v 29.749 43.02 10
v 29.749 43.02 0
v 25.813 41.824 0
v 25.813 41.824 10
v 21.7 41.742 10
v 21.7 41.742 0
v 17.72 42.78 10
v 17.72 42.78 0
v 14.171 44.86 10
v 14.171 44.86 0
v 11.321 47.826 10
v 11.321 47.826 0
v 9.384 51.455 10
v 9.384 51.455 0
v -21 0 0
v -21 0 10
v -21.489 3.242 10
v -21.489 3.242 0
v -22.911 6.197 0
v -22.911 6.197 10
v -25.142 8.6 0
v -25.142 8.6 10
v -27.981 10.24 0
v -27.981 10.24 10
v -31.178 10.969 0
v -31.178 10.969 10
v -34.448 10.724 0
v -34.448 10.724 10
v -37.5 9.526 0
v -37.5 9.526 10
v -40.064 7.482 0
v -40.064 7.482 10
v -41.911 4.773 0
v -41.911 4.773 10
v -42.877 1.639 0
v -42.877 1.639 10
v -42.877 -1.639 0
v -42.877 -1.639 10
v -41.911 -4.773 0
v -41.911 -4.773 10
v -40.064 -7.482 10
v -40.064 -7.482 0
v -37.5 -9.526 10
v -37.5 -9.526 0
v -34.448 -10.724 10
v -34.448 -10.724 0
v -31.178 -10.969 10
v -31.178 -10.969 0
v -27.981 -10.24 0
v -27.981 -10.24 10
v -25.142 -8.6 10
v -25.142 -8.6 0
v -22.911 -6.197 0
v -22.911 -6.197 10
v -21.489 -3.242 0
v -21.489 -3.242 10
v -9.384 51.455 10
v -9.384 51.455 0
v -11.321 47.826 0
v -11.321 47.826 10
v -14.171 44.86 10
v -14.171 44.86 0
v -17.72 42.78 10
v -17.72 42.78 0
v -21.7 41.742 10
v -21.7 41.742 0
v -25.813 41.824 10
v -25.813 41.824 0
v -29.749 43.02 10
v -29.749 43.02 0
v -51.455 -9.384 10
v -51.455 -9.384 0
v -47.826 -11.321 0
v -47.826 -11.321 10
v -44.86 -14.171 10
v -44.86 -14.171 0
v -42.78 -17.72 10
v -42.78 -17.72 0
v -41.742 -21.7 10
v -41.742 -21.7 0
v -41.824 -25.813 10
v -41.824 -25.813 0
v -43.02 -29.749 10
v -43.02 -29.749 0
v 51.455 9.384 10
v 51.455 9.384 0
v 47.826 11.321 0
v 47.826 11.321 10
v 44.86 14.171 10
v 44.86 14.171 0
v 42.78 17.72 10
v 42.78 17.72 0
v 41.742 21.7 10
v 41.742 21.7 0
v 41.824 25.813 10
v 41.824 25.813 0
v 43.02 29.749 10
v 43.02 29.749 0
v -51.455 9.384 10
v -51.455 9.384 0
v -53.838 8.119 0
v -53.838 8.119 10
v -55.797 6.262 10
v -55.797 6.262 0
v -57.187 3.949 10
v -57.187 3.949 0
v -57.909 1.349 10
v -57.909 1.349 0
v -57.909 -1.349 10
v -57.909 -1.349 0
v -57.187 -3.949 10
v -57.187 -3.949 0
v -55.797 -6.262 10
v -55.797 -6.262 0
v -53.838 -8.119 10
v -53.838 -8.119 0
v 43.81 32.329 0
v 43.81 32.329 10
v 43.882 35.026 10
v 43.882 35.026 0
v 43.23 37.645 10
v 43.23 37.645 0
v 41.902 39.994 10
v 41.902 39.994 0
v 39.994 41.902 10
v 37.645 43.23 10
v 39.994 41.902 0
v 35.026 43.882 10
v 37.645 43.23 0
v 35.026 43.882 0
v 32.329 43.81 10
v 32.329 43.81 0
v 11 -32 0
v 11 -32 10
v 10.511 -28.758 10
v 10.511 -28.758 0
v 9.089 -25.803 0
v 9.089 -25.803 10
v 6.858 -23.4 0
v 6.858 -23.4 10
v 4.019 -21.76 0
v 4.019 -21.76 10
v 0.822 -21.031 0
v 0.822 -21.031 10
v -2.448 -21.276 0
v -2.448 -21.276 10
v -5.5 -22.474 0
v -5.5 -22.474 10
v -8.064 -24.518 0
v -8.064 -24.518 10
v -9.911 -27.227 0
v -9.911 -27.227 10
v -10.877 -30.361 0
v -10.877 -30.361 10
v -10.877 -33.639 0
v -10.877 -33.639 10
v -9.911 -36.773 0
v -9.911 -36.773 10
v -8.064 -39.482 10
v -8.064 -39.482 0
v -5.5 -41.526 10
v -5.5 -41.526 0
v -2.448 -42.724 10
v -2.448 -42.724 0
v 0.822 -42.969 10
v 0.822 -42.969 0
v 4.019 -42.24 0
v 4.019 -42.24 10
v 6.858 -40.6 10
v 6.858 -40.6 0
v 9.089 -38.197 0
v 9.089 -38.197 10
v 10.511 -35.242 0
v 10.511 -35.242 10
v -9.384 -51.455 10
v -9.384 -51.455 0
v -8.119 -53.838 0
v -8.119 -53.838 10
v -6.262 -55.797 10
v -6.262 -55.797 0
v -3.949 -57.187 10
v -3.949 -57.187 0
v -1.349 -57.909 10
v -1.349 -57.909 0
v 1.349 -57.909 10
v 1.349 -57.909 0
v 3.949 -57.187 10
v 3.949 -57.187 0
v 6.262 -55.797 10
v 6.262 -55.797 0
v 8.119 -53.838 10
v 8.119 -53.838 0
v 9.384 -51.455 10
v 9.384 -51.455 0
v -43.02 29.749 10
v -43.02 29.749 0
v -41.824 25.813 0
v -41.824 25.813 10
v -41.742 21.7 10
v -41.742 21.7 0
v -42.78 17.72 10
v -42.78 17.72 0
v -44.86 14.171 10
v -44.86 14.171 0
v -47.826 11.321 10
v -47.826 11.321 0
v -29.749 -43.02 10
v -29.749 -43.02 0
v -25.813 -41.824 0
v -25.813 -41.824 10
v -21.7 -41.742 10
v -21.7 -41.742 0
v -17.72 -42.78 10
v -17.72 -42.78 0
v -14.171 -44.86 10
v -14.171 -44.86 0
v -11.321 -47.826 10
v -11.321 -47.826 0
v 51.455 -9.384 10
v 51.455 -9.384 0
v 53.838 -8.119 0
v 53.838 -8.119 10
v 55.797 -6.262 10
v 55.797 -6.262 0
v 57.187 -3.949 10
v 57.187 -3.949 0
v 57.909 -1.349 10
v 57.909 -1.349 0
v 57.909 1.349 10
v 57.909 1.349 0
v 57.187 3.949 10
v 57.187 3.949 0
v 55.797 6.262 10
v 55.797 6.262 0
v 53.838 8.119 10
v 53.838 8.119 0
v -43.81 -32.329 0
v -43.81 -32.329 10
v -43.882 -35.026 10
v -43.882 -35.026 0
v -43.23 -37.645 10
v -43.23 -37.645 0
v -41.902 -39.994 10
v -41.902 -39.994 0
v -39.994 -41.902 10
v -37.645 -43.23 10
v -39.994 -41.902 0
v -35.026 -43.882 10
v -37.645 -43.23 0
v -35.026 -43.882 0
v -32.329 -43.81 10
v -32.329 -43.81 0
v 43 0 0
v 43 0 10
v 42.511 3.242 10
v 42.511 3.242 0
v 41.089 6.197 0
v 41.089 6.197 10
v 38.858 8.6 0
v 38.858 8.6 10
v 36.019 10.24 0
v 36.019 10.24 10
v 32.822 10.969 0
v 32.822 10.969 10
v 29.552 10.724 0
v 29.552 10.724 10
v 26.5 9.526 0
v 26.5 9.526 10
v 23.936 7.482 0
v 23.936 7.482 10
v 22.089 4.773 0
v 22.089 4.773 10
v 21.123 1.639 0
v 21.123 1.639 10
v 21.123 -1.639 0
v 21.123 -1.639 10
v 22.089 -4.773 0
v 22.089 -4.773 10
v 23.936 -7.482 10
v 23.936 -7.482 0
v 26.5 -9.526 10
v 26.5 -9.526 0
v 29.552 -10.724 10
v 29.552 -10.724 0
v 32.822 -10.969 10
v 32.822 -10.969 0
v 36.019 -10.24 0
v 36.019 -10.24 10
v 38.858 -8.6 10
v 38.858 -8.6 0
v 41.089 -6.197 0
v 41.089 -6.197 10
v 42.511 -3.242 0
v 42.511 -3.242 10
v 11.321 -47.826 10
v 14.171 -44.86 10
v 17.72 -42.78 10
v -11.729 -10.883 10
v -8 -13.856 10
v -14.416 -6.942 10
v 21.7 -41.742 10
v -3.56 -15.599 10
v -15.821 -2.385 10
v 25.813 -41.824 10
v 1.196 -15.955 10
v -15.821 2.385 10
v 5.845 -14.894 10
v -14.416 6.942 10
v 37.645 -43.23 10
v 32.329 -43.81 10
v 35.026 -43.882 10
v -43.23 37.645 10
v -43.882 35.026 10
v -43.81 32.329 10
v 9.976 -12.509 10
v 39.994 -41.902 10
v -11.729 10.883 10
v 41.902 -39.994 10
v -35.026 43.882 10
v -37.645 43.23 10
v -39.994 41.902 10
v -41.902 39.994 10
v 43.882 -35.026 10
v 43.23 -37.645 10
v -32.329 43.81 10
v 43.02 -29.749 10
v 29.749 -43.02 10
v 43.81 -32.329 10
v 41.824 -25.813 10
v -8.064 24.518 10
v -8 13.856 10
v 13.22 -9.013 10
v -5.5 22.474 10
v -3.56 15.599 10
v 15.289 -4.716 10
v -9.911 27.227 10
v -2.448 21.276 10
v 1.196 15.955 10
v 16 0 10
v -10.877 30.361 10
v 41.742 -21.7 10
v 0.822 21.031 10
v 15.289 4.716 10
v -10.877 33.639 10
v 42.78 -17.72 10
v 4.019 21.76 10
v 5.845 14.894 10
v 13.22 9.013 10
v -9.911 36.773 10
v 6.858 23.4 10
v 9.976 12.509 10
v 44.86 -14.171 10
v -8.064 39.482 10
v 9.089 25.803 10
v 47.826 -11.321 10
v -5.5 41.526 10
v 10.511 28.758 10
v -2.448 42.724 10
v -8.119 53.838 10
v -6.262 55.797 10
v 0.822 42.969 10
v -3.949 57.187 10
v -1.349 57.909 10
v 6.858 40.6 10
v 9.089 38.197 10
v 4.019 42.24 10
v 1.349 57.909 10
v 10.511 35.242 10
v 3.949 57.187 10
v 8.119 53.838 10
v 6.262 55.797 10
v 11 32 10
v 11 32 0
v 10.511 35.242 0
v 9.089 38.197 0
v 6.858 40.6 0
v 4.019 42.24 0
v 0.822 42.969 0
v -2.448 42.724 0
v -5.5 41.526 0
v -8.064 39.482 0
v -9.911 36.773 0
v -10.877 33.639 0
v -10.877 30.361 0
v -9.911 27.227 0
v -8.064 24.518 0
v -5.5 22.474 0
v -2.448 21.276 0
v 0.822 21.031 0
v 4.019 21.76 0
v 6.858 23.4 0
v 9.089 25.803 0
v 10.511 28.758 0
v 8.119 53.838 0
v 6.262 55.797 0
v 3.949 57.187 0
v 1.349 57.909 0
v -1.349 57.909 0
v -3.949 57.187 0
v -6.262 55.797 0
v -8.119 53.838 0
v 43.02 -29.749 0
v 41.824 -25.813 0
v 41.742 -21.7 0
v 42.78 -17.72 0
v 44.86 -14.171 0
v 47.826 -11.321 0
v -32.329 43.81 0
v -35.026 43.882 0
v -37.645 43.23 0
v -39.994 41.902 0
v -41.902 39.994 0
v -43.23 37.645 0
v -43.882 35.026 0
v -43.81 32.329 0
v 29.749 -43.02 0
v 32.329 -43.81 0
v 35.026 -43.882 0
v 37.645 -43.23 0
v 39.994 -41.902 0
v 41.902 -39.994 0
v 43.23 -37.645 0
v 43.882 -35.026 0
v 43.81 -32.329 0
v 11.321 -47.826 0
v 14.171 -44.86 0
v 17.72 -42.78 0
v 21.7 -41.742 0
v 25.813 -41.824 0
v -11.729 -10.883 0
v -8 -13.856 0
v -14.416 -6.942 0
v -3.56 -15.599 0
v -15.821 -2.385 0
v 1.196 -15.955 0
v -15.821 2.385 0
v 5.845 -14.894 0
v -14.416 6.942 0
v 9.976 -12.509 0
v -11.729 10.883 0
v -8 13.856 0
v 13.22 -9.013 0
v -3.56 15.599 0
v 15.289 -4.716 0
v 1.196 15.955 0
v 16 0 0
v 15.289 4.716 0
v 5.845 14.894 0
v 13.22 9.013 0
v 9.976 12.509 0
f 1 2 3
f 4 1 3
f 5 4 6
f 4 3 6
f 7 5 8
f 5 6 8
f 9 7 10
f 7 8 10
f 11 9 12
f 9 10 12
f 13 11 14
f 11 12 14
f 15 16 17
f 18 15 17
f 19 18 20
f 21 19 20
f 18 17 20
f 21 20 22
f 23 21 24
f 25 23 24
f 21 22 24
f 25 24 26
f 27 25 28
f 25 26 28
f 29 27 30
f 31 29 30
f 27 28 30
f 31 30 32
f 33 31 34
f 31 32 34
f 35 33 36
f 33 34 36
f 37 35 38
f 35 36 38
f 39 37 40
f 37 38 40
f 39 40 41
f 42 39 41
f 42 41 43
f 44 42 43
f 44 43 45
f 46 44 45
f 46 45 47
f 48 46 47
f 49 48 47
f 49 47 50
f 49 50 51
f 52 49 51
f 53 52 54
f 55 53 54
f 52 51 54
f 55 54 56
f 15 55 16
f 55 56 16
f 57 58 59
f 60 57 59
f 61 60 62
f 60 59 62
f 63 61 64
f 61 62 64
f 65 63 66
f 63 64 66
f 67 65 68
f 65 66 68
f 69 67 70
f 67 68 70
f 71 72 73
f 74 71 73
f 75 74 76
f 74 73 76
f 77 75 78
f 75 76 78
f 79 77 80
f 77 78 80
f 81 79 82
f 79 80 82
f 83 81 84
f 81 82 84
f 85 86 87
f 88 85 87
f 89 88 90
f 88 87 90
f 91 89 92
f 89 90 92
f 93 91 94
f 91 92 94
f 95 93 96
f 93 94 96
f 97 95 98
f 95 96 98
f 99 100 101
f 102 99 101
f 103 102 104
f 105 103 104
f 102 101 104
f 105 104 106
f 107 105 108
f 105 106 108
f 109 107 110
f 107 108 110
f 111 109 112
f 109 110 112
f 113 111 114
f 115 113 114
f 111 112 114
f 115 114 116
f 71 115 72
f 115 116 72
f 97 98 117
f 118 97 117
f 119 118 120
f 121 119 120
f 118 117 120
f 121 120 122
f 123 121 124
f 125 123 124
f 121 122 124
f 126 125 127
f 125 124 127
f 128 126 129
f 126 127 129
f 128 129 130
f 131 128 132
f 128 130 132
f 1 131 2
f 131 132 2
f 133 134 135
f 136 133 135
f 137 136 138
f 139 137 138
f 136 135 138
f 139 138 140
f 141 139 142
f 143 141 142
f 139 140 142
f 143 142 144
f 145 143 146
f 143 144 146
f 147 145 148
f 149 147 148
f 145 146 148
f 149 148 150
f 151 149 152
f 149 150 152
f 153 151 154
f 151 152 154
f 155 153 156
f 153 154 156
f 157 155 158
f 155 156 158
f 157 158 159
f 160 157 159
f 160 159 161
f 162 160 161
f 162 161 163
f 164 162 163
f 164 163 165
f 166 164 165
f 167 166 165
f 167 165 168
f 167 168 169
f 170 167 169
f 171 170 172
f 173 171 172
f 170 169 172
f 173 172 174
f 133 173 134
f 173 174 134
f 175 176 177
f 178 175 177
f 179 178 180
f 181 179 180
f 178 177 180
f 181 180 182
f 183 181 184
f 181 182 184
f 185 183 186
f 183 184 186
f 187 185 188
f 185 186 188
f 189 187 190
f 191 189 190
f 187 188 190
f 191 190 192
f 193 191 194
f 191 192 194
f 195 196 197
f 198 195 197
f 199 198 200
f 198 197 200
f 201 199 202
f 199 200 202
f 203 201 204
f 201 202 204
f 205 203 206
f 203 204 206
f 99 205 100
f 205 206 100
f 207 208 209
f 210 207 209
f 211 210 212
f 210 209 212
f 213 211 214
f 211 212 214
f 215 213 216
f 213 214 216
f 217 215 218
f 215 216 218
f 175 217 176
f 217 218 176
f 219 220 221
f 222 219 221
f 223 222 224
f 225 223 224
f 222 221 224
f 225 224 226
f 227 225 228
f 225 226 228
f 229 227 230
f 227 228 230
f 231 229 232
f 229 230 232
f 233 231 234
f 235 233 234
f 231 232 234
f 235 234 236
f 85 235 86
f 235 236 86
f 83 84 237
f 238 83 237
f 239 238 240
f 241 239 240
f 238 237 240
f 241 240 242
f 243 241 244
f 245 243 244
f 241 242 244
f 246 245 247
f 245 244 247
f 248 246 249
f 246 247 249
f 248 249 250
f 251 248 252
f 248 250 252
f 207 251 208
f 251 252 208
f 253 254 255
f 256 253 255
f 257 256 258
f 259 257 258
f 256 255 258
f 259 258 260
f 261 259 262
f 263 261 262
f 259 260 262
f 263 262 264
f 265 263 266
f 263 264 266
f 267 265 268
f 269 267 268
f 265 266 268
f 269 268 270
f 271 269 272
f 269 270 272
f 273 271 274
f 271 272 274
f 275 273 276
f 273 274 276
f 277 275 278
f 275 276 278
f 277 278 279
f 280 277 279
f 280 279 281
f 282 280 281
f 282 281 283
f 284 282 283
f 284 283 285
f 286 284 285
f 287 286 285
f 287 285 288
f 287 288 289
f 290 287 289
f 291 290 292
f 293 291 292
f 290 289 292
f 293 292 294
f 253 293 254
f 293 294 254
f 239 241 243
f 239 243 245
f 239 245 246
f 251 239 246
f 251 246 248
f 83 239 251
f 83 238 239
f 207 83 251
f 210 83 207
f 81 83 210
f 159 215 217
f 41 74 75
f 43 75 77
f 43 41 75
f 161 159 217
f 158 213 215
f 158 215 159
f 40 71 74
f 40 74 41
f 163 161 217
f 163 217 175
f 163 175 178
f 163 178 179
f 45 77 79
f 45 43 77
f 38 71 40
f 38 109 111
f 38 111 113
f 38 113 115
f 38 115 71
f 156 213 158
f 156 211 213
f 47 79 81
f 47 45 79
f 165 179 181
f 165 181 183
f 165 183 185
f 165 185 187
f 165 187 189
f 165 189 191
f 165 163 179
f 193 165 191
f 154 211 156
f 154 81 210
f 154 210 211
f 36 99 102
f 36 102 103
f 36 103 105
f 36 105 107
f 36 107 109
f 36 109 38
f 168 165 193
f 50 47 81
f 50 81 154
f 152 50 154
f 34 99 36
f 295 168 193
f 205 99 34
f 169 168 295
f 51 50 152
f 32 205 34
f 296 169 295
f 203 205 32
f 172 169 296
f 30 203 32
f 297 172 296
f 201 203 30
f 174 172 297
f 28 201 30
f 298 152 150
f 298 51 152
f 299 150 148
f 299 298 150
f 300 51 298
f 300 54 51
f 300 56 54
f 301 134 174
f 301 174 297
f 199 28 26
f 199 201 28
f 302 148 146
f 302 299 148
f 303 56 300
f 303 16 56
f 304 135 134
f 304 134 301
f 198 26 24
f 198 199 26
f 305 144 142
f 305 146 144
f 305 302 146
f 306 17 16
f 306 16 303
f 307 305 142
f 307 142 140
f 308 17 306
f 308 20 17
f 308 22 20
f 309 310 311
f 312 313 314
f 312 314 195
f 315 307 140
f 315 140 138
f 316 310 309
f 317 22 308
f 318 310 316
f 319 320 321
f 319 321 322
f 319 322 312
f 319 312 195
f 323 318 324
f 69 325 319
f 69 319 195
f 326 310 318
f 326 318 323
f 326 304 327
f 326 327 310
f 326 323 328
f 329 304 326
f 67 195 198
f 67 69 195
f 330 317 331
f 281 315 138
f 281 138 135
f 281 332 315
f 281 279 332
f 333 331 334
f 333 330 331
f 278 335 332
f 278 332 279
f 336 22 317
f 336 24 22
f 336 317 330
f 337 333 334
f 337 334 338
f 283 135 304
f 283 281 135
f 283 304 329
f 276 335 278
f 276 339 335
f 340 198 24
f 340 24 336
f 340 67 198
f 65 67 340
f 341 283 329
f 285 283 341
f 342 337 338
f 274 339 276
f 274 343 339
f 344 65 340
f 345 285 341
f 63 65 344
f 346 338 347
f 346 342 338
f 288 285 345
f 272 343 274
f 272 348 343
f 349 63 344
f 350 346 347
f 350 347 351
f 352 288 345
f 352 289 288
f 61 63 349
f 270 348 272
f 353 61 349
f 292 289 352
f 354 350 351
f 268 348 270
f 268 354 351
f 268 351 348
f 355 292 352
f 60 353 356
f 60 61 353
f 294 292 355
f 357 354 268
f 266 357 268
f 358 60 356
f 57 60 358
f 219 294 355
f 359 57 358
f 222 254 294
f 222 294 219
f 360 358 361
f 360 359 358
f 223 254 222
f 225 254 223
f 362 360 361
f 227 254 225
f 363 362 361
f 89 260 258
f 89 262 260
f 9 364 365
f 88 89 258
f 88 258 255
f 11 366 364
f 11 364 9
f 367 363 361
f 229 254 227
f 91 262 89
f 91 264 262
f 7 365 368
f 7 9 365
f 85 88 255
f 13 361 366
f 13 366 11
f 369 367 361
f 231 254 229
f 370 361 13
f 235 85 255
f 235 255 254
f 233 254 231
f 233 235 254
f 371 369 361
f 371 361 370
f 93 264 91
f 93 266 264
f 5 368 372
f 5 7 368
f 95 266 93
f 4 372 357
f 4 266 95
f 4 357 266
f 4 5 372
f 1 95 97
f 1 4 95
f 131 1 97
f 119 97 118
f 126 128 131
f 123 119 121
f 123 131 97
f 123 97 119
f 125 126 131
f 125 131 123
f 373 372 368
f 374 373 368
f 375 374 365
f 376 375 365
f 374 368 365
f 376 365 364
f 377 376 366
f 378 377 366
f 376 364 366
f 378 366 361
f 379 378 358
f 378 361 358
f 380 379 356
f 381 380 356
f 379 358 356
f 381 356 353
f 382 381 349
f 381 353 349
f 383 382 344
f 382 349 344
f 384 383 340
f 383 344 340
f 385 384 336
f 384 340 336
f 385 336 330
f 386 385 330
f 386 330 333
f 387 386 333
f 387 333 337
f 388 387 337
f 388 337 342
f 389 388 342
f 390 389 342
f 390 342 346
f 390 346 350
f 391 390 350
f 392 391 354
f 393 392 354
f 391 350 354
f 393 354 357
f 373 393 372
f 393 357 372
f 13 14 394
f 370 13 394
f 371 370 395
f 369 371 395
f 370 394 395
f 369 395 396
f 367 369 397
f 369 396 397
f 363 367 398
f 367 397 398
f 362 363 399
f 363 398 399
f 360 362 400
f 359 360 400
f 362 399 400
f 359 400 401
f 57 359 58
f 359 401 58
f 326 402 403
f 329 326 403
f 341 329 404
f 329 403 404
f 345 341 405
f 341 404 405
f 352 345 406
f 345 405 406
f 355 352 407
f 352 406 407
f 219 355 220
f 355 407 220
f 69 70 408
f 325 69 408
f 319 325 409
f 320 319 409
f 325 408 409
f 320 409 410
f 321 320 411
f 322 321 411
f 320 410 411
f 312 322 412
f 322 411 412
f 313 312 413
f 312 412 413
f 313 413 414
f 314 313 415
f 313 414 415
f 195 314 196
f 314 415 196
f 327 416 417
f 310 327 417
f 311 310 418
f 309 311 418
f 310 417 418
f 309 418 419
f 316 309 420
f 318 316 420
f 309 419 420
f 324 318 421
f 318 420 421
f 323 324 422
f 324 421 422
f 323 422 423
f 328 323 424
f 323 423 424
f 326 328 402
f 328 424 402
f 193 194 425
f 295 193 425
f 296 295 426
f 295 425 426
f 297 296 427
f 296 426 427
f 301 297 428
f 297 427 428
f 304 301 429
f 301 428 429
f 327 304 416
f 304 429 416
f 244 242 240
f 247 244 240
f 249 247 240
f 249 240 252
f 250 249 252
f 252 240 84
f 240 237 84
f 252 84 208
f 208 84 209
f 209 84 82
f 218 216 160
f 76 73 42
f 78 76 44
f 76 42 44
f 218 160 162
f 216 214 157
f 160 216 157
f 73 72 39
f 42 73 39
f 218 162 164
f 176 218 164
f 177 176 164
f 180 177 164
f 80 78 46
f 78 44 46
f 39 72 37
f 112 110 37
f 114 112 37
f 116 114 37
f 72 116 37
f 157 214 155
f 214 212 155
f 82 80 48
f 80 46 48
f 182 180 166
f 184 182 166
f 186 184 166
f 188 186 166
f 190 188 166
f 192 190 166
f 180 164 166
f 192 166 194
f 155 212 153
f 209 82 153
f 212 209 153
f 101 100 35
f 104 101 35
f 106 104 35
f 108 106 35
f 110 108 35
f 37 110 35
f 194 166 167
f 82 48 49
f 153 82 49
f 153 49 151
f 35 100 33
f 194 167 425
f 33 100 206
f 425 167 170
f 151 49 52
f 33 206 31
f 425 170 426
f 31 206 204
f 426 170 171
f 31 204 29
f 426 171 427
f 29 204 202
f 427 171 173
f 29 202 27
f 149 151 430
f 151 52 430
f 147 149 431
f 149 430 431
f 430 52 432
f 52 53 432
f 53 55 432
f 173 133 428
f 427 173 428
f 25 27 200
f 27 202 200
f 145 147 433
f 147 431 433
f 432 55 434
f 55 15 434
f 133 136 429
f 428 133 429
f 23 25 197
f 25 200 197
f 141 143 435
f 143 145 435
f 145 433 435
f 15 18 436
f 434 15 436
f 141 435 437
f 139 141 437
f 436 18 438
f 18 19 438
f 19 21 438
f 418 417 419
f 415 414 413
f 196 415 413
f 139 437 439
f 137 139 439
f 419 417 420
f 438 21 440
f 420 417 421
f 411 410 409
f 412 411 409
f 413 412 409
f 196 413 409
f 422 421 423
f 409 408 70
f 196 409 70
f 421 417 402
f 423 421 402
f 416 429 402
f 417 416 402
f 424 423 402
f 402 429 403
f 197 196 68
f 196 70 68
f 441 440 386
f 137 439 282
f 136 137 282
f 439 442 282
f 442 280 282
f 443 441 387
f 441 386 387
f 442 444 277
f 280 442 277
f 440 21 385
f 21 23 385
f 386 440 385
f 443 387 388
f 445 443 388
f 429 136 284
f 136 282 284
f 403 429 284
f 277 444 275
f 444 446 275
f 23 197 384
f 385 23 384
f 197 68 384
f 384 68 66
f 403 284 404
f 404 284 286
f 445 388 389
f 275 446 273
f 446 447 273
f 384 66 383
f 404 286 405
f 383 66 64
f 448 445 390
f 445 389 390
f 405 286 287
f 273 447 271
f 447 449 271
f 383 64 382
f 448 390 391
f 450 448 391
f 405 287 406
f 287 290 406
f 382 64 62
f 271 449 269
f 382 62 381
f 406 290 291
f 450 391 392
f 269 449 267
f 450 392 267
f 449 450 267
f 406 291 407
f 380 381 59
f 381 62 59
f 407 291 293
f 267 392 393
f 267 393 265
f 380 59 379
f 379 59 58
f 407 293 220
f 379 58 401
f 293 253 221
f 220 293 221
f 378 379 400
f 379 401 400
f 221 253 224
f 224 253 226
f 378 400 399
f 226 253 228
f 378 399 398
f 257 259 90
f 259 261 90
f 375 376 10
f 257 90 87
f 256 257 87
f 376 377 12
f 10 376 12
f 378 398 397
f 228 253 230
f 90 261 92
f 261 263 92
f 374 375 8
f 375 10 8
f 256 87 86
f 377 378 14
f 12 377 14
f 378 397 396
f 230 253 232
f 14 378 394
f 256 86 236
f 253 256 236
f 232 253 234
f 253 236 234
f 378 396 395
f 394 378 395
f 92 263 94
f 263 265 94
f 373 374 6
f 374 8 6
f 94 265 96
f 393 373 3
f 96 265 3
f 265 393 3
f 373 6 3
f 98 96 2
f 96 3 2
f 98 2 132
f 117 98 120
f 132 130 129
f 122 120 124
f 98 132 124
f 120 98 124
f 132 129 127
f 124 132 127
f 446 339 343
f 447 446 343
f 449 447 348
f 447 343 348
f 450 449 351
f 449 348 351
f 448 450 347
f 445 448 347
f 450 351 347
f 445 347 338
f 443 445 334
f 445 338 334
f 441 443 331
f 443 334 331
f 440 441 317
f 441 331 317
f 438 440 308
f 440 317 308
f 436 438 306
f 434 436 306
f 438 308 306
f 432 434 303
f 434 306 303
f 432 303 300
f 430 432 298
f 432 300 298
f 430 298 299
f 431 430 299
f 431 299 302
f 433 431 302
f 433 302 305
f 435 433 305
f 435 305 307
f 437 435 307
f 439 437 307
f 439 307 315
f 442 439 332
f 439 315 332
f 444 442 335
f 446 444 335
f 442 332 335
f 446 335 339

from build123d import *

# Parameters (mm, degrees)
EXTRUDE_1_DEPTH     = 10
SKETCH_2_R          = 16
SKETCH_2_R_2        = 11
CUT_EXTRUDE_1_DEPTH = 10


with BuildPart() as part:
    # 草图1 → 凸台-拉伸1 (new body)
    with BuildSketch(Plane.XY):
        with BuildLine():
            ThreePointArc((9.384103149, 51.455229093), (0, 58), (-9.384103149, 51.455229093))
            ThreePointArc((-9.384103149, 51.455229093), (-17.720006387, 42.779879746), (-29.748778447, 43.019904391))
            ThreePointArc((-29.748778447, 43.019904391), (-41.012193309, 41.012193309), (-43.019904391, 29.748778447))
            ThreePointArc((-43.019904391, 29.748778447), (-42.779879746, 17.720006387), (-51.455229093, 9.384103149))
            ThreePointArc((-51.455229093, 9.384103149), (-58, 0), (-51.455229093, -9.384103149))
            ThreePointArc((-51.455229093, -9.384103149), (-42.779879746, -17.720006387), (-43.019904391, -29.748778447))
            ThreePointArc((-43.019904391, -29.748778447), (-41.012193309, -41.012193309), (-29.748778447, -43.019904391))
            ThreePointArc((-29.748778447, -43.019904391), (-17.720006387, -42.779879746), (-9.384103149, -51.455229093))
            ThreePointArc((-9.384103149, -51.455229093), (0, -58), (9.384103149, -51.455229093))
            ThreePointArc((9.384103149, -51.455229093), (17.720006387, -42.779879746), (29.748778447, -43.019904391))
            ThreePointArc((29.748778447, -43.019904391), (41.012193309, -41.012193309), (43.019904391, -29.748778447))
            ThreePointArc((43.019904391, -29.748778447), (42.779879746, -17.720006387), (51.455229093, -9.384103149))
            ThreePointArc((51.455229093, -9.384103149), (58, 0), (51.455229093, 9.384103149))
            ThreePointArc((51.455229093, 9.384103149), (42.779879746, 17.720006387), (43.019904391, 29.748778447))
            ThreePointArc((43.019904391, 29.748778447), (41.012193309, 41.012193309), (29.748778447, 43.019904391))
            ThreePointArc((29.748778447, 43.019904391), (17.720006387, 42.779879746), (9.384103149, 51.455229093))
        make_face()
    extrude(amount=EXTRUDE_1_DEPTH)

    # 草图2 → 切除-拉伸1 (cut)
    with BuildSketch(Plane.XY.offset(10)):
        Circle(SKETCH_2_R)
        with Locations((0, 32)):
            Circle(SKETCH_2_R_2)
        with Locations((32, 0)):
            Circle(SKETCH_2_R_2)
        with Locations((0, -32)):
            Circle(SKETCH_2_R_2)
        with Locations((-32, 0)):
            Circle(SKETCH_2_R_2)
    extrude(amount=-CUT_EXTRUDE_1_DEPTH, mode=Mode.SUBTRACT)


solid = part.part
